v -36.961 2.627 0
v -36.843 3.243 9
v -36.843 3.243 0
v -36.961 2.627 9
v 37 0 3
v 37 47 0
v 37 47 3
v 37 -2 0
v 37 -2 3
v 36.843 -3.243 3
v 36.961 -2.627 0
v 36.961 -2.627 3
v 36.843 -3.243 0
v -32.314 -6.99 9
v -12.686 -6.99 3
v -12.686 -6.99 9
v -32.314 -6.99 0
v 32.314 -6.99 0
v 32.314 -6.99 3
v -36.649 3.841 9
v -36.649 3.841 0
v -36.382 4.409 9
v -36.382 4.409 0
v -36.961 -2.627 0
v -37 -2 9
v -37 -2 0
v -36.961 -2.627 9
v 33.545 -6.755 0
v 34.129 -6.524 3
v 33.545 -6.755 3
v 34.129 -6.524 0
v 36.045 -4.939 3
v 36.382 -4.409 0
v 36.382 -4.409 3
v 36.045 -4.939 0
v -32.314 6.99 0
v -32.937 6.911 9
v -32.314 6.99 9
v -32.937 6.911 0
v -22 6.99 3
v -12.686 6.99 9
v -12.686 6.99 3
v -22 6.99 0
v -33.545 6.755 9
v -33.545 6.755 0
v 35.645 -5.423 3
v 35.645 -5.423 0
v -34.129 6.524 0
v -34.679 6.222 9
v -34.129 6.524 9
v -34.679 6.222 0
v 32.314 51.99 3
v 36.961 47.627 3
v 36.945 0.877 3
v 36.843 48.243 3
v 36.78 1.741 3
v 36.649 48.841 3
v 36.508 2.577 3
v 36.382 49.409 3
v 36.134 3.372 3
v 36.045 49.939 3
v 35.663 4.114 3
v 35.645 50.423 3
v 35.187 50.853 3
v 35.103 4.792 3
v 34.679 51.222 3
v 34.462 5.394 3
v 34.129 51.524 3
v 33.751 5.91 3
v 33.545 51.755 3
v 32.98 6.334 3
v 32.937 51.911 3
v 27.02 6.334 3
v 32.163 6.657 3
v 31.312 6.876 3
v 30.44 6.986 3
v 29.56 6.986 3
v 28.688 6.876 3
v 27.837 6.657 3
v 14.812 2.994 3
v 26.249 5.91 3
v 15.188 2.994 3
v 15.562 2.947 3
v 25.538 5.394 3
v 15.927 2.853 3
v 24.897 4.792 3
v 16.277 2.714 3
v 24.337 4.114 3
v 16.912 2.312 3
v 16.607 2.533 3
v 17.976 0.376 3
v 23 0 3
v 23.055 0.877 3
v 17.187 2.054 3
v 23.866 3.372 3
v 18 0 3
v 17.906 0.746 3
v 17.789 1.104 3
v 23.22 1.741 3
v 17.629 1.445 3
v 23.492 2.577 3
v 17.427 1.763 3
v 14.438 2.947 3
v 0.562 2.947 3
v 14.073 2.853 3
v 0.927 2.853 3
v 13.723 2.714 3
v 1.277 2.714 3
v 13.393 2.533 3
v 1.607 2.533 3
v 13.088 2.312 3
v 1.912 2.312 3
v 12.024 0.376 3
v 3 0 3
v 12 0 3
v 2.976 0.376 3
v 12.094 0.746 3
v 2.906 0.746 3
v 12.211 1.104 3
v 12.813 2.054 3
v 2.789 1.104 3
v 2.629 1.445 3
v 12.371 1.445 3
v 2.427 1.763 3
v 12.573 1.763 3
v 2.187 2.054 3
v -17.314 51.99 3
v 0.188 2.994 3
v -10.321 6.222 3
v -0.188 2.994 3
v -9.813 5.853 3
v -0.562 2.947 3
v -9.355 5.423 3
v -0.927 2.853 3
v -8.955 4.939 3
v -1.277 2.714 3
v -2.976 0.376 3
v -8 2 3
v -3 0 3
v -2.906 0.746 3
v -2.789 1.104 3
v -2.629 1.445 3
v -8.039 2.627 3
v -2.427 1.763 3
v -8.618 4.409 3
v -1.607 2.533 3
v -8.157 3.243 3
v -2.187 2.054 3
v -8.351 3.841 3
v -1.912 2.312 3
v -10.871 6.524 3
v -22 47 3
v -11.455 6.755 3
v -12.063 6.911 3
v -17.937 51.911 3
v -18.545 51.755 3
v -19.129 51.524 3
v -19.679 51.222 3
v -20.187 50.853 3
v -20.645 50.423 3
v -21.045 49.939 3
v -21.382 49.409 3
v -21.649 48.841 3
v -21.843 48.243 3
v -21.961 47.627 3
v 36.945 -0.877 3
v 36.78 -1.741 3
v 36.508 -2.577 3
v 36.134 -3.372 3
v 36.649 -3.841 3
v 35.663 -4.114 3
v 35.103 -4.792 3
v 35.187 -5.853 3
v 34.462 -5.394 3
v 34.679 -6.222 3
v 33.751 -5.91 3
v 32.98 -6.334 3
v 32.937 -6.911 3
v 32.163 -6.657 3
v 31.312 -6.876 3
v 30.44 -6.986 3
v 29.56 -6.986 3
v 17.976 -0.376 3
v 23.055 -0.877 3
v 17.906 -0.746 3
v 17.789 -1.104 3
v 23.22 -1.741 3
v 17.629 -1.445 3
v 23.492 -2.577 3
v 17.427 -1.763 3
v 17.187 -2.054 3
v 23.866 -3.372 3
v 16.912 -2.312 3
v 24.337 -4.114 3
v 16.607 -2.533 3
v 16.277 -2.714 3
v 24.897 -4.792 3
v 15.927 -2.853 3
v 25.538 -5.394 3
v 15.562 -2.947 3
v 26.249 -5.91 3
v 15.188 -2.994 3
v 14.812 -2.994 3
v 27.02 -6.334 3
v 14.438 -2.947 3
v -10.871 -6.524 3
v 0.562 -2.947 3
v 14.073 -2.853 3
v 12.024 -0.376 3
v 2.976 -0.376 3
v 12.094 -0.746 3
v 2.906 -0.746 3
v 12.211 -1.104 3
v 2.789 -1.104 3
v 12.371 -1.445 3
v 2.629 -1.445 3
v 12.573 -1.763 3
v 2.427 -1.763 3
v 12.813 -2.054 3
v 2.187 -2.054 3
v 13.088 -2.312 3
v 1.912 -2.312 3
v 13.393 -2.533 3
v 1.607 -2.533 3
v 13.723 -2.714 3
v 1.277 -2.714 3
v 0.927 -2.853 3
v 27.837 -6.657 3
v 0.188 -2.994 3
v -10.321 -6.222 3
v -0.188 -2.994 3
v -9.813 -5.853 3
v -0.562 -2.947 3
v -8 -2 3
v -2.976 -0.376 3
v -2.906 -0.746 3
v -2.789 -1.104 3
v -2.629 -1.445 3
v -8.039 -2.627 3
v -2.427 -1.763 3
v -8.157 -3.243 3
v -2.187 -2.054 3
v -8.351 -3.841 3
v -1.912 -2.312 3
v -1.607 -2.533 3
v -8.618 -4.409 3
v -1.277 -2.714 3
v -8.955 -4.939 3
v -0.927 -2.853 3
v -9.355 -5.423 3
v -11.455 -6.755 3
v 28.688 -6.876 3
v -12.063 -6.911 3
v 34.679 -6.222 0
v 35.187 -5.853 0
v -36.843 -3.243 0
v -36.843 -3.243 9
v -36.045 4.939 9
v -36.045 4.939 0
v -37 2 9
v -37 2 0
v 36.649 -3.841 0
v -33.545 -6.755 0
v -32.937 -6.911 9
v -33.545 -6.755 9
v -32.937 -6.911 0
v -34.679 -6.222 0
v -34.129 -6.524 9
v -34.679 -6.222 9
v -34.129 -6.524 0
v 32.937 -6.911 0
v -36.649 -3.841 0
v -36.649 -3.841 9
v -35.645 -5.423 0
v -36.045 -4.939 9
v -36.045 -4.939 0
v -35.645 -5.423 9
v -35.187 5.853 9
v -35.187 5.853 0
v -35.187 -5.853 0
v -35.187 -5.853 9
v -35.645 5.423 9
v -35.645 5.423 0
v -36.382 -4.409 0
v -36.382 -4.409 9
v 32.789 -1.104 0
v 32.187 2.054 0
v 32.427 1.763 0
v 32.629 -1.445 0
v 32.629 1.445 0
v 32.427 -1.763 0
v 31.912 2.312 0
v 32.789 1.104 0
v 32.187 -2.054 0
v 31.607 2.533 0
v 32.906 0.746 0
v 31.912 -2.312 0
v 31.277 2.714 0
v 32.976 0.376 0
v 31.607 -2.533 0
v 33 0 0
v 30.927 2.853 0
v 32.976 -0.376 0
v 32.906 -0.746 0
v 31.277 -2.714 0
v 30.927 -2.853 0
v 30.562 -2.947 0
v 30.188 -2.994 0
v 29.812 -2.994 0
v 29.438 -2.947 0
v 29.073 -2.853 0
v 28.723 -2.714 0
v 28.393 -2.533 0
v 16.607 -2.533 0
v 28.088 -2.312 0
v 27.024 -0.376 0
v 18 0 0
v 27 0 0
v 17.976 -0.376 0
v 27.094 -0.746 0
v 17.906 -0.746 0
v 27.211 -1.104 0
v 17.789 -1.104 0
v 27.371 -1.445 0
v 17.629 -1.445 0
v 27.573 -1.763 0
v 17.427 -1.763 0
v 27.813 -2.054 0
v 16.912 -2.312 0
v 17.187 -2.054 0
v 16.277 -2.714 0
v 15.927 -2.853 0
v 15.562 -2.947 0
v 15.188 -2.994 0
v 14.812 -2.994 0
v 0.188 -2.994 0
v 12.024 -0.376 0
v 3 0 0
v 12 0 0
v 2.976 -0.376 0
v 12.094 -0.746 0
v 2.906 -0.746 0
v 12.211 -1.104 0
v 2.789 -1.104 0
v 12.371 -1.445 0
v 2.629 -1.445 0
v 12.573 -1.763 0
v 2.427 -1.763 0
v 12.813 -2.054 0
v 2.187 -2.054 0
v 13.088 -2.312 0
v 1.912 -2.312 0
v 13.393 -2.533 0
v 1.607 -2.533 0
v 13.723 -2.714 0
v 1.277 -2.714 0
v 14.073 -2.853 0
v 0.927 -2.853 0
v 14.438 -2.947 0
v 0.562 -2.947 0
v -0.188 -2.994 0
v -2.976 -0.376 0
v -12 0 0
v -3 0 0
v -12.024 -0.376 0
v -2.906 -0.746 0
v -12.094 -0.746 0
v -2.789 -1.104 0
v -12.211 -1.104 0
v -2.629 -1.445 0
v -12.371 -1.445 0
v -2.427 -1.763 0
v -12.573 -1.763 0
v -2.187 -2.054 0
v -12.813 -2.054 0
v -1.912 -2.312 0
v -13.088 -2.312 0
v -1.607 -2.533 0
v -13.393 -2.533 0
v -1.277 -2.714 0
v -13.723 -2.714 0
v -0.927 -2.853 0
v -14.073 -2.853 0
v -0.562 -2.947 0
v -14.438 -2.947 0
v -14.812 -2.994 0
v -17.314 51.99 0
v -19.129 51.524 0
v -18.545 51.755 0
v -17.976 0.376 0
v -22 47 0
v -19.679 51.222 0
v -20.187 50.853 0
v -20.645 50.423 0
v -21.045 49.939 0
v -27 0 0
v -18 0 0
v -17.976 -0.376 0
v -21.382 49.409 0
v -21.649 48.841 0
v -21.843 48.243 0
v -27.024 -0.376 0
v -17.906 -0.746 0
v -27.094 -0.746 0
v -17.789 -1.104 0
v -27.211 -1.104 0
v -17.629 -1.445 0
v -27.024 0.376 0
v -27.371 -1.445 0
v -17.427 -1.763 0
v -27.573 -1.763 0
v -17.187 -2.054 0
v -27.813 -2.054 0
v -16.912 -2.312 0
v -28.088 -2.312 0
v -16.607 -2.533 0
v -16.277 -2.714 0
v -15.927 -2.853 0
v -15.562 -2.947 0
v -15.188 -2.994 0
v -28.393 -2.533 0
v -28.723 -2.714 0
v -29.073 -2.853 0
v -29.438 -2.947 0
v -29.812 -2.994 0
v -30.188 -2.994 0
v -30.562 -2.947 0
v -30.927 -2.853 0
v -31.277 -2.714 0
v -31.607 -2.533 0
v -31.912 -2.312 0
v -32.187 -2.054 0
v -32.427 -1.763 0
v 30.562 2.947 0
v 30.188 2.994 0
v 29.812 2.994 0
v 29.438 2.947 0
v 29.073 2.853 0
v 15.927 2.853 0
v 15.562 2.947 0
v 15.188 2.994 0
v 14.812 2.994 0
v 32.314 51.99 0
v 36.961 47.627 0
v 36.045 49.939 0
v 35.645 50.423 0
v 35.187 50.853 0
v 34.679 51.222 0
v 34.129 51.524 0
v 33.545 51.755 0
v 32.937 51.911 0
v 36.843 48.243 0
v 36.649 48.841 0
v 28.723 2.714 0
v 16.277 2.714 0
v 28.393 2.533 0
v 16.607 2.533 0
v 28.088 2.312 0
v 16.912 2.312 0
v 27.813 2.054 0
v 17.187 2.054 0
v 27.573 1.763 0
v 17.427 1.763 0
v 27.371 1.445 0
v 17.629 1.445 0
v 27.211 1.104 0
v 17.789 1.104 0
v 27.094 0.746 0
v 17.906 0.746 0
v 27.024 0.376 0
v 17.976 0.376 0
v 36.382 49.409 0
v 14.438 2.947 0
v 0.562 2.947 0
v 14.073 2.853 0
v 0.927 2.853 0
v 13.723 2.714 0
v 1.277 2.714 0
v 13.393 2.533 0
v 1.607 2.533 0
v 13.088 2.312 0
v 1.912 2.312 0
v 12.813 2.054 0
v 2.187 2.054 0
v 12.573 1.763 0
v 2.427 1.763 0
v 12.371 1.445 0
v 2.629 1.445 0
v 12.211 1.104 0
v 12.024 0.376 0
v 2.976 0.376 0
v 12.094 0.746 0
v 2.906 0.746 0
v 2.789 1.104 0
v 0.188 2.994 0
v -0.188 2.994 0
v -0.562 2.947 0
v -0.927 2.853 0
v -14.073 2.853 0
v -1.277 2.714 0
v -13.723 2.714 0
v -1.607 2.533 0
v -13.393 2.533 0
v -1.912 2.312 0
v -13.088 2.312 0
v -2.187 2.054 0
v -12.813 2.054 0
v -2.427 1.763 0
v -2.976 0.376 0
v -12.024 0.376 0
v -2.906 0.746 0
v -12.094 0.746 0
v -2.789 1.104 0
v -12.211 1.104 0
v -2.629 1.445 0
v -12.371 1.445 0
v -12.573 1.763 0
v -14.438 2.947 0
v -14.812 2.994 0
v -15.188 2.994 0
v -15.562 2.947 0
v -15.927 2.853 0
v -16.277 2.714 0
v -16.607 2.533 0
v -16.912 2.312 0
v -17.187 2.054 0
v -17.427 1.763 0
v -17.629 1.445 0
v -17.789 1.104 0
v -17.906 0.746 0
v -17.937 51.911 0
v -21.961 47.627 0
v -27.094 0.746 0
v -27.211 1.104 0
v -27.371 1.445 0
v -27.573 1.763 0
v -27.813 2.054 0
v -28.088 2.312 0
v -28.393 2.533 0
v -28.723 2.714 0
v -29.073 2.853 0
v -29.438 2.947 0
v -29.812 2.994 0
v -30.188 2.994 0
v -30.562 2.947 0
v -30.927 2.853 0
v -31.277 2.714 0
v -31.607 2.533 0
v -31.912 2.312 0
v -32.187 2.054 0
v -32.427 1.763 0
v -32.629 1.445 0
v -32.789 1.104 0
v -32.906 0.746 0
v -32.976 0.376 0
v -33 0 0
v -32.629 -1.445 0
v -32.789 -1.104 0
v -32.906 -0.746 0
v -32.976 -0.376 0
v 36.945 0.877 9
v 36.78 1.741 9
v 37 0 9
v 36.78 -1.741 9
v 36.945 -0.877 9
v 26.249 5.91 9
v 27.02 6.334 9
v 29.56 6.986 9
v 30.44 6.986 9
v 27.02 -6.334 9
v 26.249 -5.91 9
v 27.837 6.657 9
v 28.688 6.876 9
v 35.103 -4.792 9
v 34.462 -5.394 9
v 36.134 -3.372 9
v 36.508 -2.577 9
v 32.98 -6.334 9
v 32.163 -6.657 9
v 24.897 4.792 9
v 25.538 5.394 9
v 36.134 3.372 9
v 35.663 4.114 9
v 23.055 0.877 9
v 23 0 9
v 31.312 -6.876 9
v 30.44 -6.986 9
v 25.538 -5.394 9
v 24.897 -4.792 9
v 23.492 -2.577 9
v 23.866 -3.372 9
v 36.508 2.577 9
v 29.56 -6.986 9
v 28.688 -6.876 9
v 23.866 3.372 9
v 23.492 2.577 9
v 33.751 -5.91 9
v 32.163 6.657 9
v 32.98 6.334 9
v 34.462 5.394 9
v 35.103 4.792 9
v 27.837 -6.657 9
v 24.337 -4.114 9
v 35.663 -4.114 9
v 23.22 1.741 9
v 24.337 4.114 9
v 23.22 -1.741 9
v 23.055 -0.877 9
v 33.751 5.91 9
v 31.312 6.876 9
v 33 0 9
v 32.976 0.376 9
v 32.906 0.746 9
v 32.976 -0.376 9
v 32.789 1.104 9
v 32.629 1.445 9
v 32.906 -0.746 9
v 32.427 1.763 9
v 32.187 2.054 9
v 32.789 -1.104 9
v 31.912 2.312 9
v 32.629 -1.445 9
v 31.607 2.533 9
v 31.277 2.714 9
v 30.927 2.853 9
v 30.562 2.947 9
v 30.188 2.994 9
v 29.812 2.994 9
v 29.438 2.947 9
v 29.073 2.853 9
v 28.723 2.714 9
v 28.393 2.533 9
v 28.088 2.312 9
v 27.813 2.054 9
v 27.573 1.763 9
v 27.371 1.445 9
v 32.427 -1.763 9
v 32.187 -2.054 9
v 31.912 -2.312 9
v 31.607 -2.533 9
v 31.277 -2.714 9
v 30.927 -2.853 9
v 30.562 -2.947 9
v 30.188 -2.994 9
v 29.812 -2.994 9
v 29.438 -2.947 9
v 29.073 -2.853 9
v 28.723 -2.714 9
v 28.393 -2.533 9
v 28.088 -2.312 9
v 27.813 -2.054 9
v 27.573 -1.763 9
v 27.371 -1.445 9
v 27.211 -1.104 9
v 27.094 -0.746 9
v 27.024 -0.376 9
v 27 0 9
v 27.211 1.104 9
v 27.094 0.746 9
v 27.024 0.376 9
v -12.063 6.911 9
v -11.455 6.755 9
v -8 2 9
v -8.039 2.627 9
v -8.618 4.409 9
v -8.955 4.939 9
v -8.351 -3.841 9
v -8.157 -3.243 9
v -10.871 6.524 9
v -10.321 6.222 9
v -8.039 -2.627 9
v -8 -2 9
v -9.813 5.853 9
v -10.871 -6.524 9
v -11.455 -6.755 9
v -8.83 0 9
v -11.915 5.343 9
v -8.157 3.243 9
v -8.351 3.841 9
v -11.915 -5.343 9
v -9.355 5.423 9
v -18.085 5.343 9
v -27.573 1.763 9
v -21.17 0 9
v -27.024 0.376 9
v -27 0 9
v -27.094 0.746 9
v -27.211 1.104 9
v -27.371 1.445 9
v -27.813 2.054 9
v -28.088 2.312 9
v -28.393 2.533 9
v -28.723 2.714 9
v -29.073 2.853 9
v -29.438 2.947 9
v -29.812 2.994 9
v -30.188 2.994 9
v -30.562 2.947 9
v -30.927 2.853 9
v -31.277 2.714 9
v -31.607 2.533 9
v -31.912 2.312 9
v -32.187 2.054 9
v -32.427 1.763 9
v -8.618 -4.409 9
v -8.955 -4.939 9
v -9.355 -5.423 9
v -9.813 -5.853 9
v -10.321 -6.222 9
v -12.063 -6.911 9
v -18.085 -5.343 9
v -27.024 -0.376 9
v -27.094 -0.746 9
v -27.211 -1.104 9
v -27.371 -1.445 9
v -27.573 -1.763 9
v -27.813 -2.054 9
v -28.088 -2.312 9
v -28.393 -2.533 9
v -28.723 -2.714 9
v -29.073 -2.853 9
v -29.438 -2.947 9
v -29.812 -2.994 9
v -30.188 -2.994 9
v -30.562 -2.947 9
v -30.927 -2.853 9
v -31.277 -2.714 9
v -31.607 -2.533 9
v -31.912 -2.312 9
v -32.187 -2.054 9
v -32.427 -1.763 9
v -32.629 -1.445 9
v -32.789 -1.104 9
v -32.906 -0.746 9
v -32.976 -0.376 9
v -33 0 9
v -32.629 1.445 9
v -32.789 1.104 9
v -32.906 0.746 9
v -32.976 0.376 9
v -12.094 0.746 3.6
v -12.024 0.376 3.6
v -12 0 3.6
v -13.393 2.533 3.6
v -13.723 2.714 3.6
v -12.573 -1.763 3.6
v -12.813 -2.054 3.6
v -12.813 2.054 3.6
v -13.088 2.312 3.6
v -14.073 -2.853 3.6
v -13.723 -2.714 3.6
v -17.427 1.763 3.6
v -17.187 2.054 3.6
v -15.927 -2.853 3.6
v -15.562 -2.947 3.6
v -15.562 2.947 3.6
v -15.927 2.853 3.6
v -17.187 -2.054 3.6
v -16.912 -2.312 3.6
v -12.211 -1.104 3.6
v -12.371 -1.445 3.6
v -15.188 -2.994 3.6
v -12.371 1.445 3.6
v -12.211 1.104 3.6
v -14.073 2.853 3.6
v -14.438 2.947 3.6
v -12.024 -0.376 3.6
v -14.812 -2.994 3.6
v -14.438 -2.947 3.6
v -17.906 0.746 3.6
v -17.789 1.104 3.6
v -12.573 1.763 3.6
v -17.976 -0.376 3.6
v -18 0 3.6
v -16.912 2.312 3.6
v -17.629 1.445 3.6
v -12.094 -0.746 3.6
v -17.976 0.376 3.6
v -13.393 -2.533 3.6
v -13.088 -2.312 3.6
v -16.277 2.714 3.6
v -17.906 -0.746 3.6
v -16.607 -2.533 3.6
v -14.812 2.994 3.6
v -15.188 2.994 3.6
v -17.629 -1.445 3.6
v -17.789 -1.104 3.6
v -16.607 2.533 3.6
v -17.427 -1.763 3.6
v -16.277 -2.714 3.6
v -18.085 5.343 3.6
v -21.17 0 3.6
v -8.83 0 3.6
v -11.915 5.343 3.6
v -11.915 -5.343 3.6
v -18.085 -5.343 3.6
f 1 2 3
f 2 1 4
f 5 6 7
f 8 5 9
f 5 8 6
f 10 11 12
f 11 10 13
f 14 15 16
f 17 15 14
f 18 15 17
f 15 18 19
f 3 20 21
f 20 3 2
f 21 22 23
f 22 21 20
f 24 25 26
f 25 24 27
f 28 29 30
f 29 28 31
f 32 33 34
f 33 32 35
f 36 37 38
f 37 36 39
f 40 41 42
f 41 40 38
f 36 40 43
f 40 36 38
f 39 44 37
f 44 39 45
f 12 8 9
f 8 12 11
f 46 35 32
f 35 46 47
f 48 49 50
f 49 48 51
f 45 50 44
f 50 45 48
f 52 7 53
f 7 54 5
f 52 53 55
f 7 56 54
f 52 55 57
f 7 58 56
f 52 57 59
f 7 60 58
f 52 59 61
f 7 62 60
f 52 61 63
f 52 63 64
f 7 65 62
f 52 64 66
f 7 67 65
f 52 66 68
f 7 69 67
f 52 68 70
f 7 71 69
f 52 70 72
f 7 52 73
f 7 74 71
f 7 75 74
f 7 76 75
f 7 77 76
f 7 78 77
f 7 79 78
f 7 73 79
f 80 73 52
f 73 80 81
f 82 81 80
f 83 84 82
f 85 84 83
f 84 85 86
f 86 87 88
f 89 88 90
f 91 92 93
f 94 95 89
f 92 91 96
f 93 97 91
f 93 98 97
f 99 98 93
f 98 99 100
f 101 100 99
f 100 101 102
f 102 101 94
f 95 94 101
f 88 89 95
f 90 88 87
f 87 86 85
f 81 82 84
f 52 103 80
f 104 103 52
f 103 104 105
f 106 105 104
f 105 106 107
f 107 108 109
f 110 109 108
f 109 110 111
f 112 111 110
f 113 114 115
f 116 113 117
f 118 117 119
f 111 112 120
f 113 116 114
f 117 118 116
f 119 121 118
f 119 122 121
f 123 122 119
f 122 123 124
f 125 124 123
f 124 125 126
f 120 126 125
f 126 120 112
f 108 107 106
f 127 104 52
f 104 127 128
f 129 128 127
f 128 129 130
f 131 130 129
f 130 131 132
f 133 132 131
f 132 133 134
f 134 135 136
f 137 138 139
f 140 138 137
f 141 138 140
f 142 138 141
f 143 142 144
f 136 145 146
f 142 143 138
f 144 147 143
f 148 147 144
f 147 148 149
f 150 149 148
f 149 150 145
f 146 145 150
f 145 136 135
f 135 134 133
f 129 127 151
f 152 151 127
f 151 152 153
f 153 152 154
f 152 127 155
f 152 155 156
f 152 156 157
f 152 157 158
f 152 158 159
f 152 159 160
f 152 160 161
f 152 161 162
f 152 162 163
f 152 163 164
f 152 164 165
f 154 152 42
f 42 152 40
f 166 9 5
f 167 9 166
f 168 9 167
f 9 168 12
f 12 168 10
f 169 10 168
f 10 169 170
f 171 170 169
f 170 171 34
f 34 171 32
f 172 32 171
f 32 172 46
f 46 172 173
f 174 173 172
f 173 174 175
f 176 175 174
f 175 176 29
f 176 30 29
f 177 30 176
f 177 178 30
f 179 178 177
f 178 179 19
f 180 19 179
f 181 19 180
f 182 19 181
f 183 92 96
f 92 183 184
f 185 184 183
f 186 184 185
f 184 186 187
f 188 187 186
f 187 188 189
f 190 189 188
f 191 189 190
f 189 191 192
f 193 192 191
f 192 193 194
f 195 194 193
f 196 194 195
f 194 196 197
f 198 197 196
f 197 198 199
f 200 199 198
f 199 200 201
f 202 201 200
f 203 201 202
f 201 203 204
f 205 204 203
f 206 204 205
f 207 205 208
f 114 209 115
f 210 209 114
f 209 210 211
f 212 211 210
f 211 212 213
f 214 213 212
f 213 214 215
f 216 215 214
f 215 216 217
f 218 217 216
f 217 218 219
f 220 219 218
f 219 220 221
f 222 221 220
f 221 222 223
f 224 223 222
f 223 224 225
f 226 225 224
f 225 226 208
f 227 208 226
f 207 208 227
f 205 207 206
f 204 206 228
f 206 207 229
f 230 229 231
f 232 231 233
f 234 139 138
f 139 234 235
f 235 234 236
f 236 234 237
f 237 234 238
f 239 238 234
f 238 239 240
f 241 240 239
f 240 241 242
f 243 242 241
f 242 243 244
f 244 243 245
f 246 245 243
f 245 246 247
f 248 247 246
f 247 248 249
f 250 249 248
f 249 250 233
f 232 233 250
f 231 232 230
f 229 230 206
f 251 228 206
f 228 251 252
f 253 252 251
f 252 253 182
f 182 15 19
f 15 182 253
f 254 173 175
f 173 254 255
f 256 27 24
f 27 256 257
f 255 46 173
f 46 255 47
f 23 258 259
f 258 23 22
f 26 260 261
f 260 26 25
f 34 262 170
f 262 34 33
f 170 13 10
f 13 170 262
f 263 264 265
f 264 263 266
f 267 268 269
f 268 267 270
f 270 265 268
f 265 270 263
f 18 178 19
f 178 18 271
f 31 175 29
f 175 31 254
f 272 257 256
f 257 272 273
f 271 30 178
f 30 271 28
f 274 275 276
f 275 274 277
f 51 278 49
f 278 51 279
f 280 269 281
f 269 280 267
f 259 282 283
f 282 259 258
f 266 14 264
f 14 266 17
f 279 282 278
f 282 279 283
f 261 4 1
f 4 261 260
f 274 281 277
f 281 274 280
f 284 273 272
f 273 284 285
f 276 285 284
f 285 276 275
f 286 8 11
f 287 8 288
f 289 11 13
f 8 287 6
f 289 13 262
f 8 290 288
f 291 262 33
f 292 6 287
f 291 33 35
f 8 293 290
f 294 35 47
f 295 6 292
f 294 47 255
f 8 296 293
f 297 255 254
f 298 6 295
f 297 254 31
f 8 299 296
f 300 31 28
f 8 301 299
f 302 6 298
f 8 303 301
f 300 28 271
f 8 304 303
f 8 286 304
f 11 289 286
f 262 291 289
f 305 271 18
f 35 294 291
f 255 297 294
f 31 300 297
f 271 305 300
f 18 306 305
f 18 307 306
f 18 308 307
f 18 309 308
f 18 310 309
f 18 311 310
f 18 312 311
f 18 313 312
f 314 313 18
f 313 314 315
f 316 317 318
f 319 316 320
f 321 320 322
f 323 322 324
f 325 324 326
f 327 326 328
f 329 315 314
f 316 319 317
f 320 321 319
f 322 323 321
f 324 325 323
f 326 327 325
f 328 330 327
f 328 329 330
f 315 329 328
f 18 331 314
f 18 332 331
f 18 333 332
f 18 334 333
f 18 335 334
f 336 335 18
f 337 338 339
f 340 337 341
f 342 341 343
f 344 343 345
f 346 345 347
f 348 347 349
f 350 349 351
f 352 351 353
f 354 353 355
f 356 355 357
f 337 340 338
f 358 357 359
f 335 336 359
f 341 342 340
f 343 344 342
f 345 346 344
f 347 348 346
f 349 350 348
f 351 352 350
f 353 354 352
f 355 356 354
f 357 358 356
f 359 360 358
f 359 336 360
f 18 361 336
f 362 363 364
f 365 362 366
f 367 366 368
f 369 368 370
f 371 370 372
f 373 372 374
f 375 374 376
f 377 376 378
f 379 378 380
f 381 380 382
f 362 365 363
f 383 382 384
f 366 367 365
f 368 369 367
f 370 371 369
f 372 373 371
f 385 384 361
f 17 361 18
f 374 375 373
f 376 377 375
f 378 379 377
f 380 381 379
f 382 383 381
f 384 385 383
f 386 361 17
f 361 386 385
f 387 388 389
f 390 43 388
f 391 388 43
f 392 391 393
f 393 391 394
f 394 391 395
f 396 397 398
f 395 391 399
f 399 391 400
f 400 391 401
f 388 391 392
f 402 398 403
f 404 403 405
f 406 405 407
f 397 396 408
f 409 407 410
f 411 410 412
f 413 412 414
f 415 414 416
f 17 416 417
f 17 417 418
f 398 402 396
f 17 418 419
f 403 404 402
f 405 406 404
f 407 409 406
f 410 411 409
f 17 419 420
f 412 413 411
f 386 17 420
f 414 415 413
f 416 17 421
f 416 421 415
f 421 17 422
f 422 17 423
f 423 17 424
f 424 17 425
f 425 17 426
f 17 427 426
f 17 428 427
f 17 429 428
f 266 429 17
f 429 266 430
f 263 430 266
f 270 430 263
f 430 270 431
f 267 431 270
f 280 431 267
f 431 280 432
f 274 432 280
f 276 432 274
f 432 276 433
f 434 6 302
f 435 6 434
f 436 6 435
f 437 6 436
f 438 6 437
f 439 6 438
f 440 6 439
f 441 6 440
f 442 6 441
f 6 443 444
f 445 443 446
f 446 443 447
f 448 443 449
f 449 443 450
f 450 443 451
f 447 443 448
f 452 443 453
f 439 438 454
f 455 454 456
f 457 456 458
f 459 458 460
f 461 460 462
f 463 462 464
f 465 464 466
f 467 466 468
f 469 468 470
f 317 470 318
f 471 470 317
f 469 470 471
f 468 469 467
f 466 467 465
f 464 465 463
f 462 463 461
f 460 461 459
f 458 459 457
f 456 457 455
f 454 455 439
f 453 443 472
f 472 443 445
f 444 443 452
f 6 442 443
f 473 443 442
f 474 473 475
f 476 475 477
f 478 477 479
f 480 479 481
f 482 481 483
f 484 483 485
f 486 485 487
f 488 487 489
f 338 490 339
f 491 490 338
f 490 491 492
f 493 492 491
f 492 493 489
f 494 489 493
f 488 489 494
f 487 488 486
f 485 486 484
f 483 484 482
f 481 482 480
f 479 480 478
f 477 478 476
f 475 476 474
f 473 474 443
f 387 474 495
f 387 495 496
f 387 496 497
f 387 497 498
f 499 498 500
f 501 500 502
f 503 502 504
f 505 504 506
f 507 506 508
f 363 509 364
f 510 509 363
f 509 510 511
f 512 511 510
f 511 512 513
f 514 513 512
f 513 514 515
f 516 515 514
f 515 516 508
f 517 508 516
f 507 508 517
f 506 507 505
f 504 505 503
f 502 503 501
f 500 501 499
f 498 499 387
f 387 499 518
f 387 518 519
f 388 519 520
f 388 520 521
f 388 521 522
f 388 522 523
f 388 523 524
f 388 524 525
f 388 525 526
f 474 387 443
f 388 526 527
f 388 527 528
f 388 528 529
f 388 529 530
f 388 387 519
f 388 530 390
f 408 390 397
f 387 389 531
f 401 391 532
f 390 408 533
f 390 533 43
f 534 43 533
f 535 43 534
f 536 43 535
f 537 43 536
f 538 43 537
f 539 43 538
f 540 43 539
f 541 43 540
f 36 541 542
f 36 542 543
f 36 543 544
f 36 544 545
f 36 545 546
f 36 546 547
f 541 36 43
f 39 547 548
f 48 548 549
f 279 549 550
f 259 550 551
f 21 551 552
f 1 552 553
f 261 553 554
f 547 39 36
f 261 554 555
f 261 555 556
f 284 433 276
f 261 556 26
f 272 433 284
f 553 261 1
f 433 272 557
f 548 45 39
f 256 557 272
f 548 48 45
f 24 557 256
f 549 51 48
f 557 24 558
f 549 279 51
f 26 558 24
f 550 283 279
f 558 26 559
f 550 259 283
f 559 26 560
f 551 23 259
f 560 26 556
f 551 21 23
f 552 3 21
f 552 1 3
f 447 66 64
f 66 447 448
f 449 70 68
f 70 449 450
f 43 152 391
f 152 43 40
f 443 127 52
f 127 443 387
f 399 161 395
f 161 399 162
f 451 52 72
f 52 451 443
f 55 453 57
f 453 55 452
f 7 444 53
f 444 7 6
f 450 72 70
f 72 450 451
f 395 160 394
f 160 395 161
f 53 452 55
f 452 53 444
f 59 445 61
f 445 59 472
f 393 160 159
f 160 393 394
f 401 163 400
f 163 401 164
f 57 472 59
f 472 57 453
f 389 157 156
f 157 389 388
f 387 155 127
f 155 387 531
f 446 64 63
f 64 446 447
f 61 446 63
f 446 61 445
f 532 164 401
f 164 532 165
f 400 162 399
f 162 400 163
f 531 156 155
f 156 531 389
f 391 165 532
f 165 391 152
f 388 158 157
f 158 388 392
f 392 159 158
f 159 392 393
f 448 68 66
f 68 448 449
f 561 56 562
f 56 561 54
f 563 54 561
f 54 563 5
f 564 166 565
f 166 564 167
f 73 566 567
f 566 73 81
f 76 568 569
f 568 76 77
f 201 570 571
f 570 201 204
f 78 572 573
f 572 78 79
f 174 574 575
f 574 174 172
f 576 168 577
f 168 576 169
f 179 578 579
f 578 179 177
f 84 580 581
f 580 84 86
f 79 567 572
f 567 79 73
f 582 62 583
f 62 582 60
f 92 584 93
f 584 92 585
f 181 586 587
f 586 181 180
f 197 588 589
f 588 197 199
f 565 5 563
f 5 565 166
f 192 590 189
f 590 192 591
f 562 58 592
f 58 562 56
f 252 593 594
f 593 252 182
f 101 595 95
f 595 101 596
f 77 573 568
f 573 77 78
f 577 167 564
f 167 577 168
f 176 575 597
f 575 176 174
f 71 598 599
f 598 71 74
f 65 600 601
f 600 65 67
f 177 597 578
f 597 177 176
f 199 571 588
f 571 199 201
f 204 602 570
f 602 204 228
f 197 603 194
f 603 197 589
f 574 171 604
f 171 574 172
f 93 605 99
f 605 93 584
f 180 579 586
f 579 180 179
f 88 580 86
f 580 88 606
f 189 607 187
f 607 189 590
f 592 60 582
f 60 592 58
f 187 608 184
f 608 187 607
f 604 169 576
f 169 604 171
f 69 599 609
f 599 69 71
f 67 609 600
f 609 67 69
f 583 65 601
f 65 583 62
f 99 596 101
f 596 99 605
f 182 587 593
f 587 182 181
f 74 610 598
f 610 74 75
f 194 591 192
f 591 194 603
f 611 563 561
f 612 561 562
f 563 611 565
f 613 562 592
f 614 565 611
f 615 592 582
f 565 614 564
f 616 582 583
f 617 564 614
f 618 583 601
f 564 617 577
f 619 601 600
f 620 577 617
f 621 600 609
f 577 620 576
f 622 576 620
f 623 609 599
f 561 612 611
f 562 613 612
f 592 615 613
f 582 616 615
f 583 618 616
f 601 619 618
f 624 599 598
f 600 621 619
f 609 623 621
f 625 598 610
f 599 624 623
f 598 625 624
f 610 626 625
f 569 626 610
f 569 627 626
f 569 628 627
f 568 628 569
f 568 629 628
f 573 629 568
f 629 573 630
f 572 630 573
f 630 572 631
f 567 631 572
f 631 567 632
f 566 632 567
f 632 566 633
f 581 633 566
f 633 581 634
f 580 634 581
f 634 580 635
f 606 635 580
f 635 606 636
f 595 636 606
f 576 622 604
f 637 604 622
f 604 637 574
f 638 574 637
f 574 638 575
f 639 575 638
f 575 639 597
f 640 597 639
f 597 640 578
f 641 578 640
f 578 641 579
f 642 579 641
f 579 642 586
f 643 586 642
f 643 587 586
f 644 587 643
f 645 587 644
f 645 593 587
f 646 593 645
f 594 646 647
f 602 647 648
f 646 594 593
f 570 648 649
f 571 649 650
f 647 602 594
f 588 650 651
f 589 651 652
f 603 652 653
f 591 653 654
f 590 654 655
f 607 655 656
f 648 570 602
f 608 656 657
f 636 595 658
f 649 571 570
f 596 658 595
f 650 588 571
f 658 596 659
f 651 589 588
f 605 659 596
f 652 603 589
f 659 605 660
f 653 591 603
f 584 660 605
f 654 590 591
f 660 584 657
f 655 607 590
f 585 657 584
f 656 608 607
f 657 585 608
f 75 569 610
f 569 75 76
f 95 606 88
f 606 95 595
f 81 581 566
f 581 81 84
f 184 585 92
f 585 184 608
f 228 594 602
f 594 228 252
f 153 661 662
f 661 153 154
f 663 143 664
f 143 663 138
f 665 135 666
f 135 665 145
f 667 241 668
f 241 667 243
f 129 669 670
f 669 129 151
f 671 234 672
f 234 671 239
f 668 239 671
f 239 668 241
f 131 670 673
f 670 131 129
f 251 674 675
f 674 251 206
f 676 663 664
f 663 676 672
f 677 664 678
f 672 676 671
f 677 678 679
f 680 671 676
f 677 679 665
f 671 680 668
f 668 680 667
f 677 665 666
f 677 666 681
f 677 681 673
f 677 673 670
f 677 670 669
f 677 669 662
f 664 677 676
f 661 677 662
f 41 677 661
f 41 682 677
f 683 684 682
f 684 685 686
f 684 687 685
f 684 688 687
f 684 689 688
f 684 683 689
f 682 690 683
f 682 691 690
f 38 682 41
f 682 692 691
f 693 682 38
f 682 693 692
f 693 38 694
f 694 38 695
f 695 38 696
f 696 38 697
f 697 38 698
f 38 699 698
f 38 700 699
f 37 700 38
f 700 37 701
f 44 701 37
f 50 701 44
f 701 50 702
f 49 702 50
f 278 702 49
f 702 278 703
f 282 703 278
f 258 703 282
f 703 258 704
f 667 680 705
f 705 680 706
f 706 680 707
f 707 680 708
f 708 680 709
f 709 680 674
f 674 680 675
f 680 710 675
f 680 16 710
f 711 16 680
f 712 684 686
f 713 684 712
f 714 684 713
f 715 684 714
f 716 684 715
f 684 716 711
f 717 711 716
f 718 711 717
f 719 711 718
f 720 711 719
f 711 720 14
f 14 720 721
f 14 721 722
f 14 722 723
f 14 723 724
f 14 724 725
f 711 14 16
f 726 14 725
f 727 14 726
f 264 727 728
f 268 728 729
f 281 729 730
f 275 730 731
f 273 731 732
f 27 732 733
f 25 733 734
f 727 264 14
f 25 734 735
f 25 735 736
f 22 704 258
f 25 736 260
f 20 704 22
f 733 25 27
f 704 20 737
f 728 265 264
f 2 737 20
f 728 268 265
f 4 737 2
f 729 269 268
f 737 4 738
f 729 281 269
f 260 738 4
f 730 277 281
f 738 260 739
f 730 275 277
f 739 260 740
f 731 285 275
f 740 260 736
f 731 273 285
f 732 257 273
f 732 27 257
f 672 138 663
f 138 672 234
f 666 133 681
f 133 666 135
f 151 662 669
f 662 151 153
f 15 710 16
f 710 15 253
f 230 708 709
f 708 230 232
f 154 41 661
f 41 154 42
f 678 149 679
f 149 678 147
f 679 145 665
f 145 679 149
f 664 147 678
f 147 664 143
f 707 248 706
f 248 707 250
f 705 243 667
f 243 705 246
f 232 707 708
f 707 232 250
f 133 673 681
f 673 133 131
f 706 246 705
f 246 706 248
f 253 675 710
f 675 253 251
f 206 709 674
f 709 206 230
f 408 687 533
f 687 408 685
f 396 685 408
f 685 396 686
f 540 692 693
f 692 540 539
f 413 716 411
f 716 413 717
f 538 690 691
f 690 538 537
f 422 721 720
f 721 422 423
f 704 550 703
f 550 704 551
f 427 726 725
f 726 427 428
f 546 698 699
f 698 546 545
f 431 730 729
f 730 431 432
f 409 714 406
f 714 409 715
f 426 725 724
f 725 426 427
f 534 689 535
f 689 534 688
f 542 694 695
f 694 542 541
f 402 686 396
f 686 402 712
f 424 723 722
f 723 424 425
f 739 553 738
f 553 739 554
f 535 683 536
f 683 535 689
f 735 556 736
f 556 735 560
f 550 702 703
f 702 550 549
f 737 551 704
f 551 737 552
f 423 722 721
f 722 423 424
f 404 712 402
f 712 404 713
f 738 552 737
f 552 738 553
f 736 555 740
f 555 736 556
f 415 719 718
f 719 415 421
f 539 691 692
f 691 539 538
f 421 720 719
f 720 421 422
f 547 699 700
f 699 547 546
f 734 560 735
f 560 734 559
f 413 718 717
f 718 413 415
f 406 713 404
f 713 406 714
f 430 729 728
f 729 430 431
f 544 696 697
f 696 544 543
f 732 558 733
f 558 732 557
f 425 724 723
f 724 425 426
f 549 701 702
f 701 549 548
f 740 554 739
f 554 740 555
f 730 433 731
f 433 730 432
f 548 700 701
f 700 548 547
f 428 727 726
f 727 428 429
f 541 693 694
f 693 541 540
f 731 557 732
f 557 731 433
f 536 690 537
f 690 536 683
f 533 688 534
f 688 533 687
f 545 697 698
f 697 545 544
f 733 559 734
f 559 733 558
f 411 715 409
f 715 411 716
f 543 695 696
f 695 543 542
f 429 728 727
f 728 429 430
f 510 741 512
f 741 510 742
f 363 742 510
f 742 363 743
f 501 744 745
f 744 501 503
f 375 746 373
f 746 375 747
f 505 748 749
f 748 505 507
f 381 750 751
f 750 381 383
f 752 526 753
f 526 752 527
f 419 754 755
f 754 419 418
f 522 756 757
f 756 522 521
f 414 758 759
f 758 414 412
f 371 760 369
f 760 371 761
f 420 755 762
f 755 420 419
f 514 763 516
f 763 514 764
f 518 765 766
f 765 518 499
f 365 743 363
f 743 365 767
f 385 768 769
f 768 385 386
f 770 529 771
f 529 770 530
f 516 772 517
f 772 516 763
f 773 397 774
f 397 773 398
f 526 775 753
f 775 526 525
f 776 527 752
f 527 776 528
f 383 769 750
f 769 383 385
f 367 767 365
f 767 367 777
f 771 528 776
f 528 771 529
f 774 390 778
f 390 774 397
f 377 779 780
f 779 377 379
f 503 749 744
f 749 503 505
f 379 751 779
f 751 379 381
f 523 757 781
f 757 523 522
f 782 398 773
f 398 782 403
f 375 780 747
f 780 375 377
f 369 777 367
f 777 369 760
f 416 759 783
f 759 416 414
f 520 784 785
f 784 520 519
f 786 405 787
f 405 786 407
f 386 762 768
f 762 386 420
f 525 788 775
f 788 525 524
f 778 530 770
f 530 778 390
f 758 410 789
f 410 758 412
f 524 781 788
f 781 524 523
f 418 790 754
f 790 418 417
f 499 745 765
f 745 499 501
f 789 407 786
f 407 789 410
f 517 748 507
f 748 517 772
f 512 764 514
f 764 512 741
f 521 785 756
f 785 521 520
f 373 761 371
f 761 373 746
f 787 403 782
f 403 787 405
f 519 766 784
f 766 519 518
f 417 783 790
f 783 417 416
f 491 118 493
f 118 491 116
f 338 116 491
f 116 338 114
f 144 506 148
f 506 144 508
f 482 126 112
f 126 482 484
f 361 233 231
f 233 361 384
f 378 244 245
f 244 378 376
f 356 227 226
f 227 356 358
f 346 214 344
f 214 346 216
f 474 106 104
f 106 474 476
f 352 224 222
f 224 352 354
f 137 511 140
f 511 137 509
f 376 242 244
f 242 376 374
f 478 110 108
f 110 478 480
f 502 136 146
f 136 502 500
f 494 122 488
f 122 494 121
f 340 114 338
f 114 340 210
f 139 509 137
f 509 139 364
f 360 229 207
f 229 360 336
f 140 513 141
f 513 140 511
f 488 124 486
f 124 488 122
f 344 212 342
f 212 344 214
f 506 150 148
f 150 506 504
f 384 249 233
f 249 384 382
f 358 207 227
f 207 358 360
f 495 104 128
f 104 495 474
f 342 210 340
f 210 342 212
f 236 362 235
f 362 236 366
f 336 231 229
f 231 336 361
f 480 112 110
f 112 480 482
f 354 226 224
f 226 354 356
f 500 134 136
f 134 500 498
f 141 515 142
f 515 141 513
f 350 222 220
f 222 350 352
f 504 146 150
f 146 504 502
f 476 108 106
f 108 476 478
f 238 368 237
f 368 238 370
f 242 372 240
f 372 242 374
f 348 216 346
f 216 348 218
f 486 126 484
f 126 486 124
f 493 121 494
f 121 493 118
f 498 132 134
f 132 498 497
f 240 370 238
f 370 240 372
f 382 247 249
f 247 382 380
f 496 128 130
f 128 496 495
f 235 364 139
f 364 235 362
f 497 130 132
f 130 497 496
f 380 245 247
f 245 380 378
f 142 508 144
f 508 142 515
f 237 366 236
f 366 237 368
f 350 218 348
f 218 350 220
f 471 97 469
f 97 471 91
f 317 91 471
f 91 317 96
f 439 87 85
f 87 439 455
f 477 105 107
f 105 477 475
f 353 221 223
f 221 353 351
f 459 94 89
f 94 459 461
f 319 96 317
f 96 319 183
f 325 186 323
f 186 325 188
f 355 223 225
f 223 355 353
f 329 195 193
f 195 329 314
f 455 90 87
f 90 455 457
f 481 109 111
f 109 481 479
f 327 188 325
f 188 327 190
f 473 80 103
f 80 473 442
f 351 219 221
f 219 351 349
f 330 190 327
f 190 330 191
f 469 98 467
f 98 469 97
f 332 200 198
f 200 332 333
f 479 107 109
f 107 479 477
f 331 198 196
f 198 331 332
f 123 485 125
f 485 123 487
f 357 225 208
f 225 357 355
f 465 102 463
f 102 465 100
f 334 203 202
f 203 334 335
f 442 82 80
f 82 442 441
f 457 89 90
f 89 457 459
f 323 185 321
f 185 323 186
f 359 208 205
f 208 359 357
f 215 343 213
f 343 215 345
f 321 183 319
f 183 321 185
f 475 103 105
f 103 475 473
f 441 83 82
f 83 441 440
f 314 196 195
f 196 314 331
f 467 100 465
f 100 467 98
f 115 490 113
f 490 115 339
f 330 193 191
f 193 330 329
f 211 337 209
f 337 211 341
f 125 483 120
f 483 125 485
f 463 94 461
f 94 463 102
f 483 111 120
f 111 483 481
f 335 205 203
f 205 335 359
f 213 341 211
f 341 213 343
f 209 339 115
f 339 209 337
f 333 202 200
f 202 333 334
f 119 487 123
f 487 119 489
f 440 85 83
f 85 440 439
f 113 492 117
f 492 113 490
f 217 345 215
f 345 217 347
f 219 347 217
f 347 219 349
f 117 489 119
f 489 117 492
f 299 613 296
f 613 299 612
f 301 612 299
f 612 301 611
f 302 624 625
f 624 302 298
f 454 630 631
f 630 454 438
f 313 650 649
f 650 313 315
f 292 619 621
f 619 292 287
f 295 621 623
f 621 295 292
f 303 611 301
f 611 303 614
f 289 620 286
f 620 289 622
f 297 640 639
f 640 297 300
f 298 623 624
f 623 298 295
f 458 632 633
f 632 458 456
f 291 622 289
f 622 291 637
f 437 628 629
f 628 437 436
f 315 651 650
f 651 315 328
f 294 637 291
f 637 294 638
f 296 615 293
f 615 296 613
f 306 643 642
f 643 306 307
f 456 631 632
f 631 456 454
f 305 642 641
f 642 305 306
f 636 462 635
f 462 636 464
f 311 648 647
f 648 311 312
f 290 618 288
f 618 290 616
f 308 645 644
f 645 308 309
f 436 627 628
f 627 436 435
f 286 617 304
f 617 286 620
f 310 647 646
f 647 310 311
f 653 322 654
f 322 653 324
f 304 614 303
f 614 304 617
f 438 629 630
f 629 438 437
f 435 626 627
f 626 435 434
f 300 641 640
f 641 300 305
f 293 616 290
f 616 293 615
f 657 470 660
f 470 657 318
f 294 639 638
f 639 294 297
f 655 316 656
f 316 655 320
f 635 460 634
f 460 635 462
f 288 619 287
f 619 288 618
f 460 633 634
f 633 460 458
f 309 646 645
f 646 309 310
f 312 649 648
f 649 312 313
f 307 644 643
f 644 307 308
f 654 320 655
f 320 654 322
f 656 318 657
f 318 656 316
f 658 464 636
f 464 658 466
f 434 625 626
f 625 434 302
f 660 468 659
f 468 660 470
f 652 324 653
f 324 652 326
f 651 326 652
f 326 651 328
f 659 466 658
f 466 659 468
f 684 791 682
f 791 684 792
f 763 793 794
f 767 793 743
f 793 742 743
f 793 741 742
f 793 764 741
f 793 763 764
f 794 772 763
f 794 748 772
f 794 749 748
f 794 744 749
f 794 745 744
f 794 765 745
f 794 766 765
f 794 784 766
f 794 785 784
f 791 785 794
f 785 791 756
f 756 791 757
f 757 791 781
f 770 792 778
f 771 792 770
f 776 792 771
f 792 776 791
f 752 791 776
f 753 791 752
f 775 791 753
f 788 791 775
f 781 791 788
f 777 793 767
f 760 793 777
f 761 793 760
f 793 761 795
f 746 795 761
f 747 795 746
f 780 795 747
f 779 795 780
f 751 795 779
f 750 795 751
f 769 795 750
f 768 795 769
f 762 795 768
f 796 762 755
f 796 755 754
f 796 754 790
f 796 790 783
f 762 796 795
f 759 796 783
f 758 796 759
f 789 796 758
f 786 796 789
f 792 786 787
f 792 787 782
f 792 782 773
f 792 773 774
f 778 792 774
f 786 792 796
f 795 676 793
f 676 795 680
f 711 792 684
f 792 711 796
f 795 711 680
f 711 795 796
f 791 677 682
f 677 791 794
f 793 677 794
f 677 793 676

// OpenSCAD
$fn = 50;


difference() {
	union() {
		translate(v = [0, 0, 0]) {
			rotate(a = [0, 0, 0]) {
				hull() {
					translate(v = [-32.0000000000, 2.0000000000, 0]) {
						rotate(a = [0, 0, 0]) {
							translate(v = [0, 0, 0]) {
								rotate(a = [0, 0, 0]) {
									cylinder(h = 3, r = 5);
								}
							}
						}
					}
					translate(v = [32.0000000000, 2.0000000000, 0]) {
						rotate(a = [0, 0, 0]) {
							translate(v = [0, 0, 0]) {
								rotate(a = [0, 0, 0]) {
									cylinder(h = 3, r = 5);
								}
							}
						}
					}
					translate(v = [-32.0000000000, -2.0000000000, 0]) {
						rotate(a = [0, 0, 0]) {
							translate(v = [0, 0, 0]) {
								rotate(a = [0, 0, 0]) {
									cylinder(h = 3, r = 5);
								}
							}
						}
					}
					translate(v = [32.0000000000, -2.0000000000, 0]) {
						rotate(a = [0, 0, 0]) {
							translate(v = [0, 0, 0]) {
								rotate(a = [0, 0, 0]) {
									cylinder(h = 3, r = 5);
								}
							}
						}
					}
				}
			}
		}
		translate(v = [7.5000000000, 22.5000000000, 0]) {
			rotate(a = [0, 0, 0]) {
				hull() {
					translate(v = [-24.5000000000, 24.5000000000, 0]) {
						rotate(a = [0, 0, 0]) {
							translate(v = [0, 0, 0]) {
								rotate(a = [0, 0, 0]) {
									cylinder(h = 3, r = 5);
								}
							}
						}
					}
					translate(v = [24.5000000000, 24.5000000000, 0]) {
						rotate(a = [0, 0, 0]) {
							translate(v = [0, 0, 0]) {
								rotate(a = [0, 0, 0]) {
									cylinder(h = 3, r = 5);
								}
							}
						}
					}
					translate(v = [-24.5000000000, -24.5000000000, 0]) {
						rotate(a = [0, 0, 0]) {
							translate(v = [0, 0, 0]) {
								rotate(a = [0, 0, 0]) {
									cylinder(h = 3, r = 5);
								}
							}
						}
					}
					translate(v = [24.5000000000, -24.5000000000, 0]) {
						rotate(a = [0, 0, 0]) {
							translate(v = [0, 0, 0]) {
								rotate(a = [0, 0, 0]) {
									cylinder(h = 3, r = 5);
								}
							}
						}
					}
				}
			}
		}
		translate(v = [30.0000000000, 0, 0]) {
			rotate(a = [0, 0, 0]) {
				cylinder(h = 9, r = 7.0000000000);
			}
		}
		translate(v = [-22.5000000000, 0, 0]) {
			rotate(a = [0, 0, 0]) {
				hull() {
					translate(v = [-9.5000000000, 2.0000000000, 0]) {
						rotate(a = [0, 0, 0]) {
							translate(v = [0, 0, 0]) {
								rotate(a = [0, 0, 0]) {
									cylinder(h = 9, r = 5);
								}
							}
						}
					}
					translate(v = [9.5000000000, 2.0000000000, 0]) {
						rotate(a = [0, 0, 0]) {
							translate(v = [0, 0, 0]) {
								rotate(a = [0, 0, 0]) {
									cylinder(h = 9, r = 5);
								}
							}
						}
					}
					translate(v = [-9.5000000000, -2.0000000000, 0]) {
						rotate(a = [0, 0, 0]) {
							translate(v = [0, 0, 0]) {
								rotate(a = [0, 0, 0]) {
									cylinder(h = 9, r = 5);
								}
							}
						}
					}
					translate(v = [9.5000000000, -2.0000000000, 0]) {
						rotate(a = [0, 0, 0]) {
							translate(v = [0, 0, 0]) {
								rotate(a = [0, 0, 0]) {
									cylinder(h = 9, r = 5);
								}
							}
						}
					}
				}
			}
		}
	}
	union() {
		translate(v = [-30.0000000000, 0.0000000000, 0]) {
			rotate(a = [0, 0, 0]) {
				translate(v = [0, 0, -50]) {
					rotate(a = [0, 0, 0]) {
						cylinder(h = 100, r = 3.0000000000);
					}
				}
			}
		}
		translate(v = [-15.0000000000, 0.0000000000, 0]) {
			rotate(a = [0, 0, 0]) {
				translate(v = [0, 0, -50]) {
					rotate(a = [0, 0, 0]) {
						cylinder(h = 100, r = 3.0000000000);
					}
				}
			}
		}
		translate(v = [0.0000000000, 0.0000000000, 0]) {
			rotate(a = [0, 0, 0]) {
				translate(v = [0, 0, -50]) {
					rotate(a = [0, 0, 0]) {
						cylinder(h = 100, r = 3.0000000000);
					}
				}
			}
		}
		translate(v = [15.0000000000, 0.0000000000, 0]) {
			rotate(a = [0, 0, 0]) {
				translate(v = [0, 0, -50]) {
					rotate(a = [0, 0, 0]) {
						cylinder(h = 100, r = 3.0000000000);
					}
				}
			}
		}
		translate(v = [30.0000000000, 0.0000000000, 0]) {
			rotate(a = [0, 0, 0]) {
				translate(v = [0, 0, -50]) {
					rotate(a = [0, 0, 0]) {
						cylinder(h = 100, r = 3.0000000000);
					}
				}
			}
		}
		translate(v = [-15.0000000000, 0, 3.6000000000]) {
			rotate(a = [0, 0, 0]) {
				translate(v = [0, 0, 0]) {
					rotate(a = [0, 0, 0]) {
						linear_extrude(height = 5.4000000000) {
							polygon(points = [[6.1700000000, 0.0000000000], [3.0850000000, 5.3433767413], [-3.0850000000, 5.3433767413], [-6.1700000000, 0.0000000000], [-3.0850000000, -5.3433767413], [3.0850000000, -5.3433767413]]);
						}
					}
				}
			}
		}
	}
}
